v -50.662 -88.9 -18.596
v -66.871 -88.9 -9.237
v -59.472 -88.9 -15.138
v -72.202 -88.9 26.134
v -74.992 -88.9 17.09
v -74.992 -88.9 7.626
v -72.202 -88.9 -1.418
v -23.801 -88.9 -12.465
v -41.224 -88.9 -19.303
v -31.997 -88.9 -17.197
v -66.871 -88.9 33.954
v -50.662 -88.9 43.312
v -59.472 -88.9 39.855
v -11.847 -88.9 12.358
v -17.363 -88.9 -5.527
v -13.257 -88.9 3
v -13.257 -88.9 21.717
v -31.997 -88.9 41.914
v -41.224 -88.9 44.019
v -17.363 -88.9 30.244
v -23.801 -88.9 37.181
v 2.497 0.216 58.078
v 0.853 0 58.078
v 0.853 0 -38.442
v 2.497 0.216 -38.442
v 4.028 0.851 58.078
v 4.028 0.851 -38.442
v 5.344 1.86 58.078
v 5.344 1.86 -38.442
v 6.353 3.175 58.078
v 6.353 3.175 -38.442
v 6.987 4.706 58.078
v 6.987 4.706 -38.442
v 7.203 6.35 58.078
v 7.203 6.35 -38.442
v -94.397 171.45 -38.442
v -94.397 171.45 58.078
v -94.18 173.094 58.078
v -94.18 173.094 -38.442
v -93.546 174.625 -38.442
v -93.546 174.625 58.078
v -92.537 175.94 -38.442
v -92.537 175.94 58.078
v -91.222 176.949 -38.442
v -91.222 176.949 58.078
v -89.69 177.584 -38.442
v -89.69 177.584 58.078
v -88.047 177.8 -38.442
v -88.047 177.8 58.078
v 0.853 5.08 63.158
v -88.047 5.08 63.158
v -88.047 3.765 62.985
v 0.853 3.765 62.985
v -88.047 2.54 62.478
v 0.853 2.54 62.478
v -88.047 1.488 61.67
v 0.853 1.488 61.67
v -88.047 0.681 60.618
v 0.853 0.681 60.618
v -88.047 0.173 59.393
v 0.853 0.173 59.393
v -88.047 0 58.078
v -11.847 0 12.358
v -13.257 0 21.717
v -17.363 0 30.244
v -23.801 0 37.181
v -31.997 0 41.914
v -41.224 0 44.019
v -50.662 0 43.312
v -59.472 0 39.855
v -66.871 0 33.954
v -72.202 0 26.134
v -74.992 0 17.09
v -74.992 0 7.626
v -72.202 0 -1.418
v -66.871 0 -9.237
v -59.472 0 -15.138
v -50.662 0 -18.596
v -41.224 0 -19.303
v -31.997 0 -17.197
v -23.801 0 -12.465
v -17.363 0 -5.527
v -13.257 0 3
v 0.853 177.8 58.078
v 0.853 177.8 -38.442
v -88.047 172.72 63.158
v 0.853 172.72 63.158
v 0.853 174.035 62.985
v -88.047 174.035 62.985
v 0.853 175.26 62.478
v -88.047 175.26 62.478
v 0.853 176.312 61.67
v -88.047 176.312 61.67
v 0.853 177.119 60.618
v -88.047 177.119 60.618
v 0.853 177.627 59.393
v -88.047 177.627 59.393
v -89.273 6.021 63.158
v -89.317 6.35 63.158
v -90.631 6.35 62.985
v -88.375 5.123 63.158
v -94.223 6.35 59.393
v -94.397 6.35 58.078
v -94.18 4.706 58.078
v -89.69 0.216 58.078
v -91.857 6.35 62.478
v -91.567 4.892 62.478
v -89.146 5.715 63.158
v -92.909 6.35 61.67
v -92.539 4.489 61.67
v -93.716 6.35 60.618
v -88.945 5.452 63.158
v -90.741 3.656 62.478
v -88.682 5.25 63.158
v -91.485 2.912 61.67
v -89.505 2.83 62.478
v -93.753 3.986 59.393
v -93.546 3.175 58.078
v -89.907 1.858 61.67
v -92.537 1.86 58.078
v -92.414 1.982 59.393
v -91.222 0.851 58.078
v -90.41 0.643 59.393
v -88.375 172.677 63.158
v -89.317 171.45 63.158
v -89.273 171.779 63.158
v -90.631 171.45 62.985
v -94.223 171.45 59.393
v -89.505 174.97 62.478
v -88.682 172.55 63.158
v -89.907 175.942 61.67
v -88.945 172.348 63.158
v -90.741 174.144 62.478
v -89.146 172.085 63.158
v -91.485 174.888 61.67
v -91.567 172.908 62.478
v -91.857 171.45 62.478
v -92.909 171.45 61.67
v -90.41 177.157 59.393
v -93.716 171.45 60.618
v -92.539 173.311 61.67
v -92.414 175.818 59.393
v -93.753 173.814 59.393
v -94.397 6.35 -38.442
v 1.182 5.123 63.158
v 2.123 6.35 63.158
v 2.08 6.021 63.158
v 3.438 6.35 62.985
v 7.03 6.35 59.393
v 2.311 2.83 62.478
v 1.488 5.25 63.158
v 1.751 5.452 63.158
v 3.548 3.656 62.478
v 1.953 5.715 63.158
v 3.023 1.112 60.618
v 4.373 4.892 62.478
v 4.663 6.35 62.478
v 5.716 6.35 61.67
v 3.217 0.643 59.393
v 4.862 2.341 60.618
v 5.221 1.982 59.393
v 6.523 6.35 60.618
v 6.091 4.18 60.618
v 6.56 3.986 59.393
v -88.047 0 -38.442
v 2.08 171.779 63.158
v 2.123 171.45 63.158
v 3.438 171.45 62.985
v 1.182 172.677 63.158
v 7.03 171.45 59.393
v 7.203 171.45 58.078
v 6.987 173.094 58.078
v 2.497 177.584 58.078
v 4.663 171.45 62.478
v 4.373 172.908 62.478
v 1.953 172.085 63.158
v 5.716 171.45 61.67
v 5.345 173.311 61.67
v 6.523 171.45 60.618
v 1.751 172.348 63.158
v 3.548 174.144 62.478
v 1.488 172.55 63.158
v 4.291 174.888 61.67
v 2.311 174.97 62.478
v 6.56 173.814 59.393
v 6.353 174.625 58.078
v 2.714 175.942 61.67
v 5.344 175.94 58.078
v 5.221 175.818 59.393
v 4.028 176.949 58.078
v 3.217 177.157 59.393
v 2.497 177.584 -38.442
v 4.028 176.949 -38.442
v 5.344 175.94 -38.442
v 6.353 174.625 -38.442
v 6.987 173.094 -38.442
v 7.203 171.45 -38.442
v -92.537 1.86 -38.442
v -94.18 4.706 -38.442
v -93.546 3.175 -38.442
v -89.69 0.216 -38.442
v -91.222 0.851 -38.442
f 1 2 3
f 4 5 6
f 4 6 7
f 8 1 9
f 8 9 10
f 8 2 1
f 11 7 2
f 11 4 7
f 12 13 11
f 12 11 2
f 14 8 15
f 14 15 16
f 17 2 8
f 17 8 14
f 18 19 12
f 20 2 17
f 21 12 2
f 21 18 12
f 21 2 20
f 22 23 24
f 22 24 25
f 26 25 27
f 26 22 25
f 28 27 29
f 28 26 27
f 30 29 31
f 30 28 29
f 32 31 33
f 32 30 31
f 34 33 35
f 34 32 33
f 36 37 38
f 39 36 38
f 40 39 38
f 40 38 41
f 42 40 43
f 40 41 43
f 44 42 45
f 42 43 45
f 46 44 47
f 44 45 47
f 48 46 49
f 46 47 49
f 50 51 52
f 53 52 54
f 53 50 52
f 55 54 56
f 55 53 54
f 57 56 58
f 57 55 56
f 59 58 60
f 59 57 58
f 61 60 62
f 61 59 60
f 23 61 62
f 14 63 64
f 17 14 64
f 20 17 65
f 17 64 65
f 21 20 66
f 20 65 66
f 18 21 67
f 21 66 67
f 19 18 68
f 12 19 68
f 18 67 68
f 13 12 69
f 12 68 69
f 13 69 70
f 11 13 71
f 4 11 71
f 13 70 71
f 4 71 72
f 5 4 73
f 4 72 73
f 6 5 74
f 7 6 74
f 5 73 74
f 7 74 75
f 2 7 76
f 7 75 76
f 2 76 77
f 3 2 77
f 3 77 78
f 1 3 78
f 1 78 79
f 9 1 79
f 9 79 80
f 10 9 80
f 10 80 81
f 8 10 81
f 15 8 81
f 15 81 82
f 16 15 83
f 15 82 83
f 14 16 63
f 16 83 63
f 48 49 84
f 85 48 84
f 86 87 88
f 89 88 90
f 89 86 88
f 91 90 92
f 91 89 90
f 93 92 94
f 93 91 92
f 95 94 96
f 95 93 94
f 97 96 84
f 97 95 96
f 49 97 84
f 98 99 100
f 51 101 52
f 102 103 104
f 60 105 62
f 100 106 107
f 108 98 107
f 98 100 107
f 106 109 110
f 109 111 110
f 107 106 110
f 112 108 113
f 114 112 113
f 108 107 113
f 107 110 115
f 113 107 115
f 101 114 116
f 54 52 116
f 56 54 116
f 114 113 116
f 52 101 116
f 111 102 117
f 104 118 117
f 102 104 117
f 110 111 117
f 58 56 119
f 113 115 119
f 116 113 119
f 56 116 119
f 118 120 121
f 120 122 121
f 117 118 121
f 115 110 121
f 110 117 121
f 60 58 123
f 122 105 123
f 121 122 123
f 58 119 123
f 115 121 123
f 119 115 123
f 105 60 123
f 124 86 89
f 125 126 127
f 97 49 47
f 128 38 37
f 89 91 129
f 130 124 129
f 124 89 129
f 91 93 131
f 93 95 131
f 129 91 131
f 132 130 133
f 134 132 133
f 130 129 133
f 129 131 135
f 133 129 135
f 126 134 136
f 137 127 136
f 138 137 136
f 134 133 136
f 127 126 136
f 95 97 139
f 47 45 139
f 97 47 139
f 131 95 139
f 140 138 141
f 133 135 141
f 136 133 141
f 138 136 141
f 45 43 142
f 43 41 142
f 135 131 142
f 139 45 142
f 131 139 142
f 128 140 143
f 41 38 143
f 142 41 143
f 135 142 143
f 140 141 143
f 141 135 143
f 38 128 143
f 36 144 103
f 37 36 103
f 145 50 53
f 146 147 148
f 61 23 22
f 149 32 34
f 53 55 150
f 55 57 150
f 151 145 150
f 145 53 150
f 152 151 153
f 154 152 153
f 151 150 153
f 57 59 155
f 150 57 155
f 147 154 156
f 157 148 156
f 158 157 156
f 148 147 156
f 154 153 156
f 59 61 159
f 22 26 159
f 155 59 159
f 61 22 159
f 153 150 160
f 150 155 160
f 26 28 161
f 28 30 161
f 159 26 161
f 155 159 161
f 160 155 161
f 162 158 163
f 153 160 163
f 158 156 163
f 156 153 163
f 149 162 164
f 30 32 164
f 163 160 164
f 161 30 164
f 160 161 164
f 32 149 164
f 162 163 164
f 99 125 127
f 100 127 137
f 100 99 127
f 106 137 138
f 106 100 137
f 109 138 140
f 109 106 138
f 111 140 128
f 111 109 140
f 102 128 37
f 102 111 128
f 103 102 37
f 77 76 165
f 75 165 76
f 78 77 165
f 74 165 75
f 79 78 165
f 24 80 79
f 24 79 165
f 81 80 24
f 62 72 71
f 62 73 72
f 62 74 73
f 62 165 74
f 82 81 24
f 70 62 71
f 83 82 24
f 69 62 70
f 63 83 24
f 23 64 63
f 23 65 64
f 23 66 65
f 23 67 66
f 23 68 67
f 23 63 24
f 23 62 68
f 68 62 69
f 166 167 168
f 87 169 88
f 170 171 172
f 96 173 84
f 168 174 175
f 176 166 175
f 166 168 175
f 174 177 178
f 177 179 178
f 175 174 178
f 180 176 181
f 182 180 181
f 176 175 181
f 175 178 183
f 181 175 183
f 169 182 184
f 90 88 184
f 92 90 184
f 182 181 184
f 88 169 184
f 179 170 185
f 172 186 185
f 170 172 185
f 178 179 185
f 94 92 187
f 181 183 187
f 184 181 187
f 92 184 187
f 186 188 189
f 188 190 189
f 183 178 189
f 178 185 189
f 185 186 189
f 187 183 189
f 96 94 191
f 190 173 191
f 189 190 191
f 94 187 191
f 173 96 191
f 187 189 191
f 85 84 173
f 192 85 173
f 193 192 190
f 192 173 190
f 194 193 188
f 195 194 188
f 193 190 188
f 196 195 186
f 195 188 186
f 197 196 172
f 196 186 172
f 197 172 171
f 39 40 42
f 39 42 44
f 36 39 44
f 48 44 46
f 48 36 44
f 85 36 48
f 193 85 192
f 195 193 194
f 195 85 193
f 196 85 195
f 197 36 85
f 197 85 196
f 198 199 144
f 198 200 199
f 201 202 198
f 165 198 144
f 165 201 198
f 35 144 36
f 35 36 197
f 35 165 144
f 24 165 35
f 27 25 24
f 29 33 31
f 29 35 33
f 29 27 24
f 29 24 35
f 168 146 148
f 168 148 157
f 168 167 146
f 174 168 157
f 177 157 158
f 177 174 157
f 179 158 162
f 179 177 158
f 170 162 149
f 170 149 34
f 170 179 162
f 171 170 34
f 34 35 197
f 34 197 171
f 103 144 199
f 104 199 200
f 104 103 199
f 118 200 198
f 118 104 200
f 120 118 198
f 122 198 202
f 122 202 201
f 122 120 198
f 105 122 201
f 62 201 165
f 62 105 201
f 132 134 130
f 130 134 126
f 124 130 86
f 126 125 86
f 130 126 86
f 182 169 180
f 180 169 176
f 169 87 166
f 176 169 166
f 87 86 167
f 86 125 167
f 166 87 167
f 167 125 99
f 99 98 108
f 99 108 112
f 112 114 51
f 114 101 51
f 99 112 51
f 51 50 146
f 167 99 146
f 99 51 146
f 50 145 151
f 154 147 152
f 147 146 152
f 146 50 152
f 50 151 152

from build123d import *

# Parameters (mm, degrees)
F0_W     = 101.6
F0_H     = 101.6
F1_DEPTH = 177.8
F2_R     = 31.75
F3_DEPTH = 88.9
F4_R     = 6.35
F5_R     = 5.08


with BuildPart() as f1:
    # F0 (on Front) → F1 (new body)
    with BuildSketch(Plane.XZ):
        with Locations((-43.596539, 12.358267)):
            Rectangle(F0_W, F0_H)
    extrude(amount=-F1_DEPTH)

    # F2 (on face) → F3 (join)
    with BuildSketch(Plane.XZ):
        with Locations((-43.596539, 12.358267)):
            Circle(F2_R)
    extrude(amount=F3_DEPTH)

    # F4
    f4_edges = [f1.edges().sort_by_distance(p)[0] for p in [
        (7.203461, 0, 12.358267),
        (-94.396539, 0, 12.358267),
        (7.203461, 177.8, 12.358267),
        (-94.396539, 177.8, 12.358267),
    ]]
    fillet(f4_edges, radius=F4_R)

    # F5
    f5_edges = [f1.edges().sort_by_distance(p)[0] for p in [
        (7.203461, 88.9, 63.158267),
    ]]
    fillet(f5_edges, radius=F5_R)


solid = f1.part
